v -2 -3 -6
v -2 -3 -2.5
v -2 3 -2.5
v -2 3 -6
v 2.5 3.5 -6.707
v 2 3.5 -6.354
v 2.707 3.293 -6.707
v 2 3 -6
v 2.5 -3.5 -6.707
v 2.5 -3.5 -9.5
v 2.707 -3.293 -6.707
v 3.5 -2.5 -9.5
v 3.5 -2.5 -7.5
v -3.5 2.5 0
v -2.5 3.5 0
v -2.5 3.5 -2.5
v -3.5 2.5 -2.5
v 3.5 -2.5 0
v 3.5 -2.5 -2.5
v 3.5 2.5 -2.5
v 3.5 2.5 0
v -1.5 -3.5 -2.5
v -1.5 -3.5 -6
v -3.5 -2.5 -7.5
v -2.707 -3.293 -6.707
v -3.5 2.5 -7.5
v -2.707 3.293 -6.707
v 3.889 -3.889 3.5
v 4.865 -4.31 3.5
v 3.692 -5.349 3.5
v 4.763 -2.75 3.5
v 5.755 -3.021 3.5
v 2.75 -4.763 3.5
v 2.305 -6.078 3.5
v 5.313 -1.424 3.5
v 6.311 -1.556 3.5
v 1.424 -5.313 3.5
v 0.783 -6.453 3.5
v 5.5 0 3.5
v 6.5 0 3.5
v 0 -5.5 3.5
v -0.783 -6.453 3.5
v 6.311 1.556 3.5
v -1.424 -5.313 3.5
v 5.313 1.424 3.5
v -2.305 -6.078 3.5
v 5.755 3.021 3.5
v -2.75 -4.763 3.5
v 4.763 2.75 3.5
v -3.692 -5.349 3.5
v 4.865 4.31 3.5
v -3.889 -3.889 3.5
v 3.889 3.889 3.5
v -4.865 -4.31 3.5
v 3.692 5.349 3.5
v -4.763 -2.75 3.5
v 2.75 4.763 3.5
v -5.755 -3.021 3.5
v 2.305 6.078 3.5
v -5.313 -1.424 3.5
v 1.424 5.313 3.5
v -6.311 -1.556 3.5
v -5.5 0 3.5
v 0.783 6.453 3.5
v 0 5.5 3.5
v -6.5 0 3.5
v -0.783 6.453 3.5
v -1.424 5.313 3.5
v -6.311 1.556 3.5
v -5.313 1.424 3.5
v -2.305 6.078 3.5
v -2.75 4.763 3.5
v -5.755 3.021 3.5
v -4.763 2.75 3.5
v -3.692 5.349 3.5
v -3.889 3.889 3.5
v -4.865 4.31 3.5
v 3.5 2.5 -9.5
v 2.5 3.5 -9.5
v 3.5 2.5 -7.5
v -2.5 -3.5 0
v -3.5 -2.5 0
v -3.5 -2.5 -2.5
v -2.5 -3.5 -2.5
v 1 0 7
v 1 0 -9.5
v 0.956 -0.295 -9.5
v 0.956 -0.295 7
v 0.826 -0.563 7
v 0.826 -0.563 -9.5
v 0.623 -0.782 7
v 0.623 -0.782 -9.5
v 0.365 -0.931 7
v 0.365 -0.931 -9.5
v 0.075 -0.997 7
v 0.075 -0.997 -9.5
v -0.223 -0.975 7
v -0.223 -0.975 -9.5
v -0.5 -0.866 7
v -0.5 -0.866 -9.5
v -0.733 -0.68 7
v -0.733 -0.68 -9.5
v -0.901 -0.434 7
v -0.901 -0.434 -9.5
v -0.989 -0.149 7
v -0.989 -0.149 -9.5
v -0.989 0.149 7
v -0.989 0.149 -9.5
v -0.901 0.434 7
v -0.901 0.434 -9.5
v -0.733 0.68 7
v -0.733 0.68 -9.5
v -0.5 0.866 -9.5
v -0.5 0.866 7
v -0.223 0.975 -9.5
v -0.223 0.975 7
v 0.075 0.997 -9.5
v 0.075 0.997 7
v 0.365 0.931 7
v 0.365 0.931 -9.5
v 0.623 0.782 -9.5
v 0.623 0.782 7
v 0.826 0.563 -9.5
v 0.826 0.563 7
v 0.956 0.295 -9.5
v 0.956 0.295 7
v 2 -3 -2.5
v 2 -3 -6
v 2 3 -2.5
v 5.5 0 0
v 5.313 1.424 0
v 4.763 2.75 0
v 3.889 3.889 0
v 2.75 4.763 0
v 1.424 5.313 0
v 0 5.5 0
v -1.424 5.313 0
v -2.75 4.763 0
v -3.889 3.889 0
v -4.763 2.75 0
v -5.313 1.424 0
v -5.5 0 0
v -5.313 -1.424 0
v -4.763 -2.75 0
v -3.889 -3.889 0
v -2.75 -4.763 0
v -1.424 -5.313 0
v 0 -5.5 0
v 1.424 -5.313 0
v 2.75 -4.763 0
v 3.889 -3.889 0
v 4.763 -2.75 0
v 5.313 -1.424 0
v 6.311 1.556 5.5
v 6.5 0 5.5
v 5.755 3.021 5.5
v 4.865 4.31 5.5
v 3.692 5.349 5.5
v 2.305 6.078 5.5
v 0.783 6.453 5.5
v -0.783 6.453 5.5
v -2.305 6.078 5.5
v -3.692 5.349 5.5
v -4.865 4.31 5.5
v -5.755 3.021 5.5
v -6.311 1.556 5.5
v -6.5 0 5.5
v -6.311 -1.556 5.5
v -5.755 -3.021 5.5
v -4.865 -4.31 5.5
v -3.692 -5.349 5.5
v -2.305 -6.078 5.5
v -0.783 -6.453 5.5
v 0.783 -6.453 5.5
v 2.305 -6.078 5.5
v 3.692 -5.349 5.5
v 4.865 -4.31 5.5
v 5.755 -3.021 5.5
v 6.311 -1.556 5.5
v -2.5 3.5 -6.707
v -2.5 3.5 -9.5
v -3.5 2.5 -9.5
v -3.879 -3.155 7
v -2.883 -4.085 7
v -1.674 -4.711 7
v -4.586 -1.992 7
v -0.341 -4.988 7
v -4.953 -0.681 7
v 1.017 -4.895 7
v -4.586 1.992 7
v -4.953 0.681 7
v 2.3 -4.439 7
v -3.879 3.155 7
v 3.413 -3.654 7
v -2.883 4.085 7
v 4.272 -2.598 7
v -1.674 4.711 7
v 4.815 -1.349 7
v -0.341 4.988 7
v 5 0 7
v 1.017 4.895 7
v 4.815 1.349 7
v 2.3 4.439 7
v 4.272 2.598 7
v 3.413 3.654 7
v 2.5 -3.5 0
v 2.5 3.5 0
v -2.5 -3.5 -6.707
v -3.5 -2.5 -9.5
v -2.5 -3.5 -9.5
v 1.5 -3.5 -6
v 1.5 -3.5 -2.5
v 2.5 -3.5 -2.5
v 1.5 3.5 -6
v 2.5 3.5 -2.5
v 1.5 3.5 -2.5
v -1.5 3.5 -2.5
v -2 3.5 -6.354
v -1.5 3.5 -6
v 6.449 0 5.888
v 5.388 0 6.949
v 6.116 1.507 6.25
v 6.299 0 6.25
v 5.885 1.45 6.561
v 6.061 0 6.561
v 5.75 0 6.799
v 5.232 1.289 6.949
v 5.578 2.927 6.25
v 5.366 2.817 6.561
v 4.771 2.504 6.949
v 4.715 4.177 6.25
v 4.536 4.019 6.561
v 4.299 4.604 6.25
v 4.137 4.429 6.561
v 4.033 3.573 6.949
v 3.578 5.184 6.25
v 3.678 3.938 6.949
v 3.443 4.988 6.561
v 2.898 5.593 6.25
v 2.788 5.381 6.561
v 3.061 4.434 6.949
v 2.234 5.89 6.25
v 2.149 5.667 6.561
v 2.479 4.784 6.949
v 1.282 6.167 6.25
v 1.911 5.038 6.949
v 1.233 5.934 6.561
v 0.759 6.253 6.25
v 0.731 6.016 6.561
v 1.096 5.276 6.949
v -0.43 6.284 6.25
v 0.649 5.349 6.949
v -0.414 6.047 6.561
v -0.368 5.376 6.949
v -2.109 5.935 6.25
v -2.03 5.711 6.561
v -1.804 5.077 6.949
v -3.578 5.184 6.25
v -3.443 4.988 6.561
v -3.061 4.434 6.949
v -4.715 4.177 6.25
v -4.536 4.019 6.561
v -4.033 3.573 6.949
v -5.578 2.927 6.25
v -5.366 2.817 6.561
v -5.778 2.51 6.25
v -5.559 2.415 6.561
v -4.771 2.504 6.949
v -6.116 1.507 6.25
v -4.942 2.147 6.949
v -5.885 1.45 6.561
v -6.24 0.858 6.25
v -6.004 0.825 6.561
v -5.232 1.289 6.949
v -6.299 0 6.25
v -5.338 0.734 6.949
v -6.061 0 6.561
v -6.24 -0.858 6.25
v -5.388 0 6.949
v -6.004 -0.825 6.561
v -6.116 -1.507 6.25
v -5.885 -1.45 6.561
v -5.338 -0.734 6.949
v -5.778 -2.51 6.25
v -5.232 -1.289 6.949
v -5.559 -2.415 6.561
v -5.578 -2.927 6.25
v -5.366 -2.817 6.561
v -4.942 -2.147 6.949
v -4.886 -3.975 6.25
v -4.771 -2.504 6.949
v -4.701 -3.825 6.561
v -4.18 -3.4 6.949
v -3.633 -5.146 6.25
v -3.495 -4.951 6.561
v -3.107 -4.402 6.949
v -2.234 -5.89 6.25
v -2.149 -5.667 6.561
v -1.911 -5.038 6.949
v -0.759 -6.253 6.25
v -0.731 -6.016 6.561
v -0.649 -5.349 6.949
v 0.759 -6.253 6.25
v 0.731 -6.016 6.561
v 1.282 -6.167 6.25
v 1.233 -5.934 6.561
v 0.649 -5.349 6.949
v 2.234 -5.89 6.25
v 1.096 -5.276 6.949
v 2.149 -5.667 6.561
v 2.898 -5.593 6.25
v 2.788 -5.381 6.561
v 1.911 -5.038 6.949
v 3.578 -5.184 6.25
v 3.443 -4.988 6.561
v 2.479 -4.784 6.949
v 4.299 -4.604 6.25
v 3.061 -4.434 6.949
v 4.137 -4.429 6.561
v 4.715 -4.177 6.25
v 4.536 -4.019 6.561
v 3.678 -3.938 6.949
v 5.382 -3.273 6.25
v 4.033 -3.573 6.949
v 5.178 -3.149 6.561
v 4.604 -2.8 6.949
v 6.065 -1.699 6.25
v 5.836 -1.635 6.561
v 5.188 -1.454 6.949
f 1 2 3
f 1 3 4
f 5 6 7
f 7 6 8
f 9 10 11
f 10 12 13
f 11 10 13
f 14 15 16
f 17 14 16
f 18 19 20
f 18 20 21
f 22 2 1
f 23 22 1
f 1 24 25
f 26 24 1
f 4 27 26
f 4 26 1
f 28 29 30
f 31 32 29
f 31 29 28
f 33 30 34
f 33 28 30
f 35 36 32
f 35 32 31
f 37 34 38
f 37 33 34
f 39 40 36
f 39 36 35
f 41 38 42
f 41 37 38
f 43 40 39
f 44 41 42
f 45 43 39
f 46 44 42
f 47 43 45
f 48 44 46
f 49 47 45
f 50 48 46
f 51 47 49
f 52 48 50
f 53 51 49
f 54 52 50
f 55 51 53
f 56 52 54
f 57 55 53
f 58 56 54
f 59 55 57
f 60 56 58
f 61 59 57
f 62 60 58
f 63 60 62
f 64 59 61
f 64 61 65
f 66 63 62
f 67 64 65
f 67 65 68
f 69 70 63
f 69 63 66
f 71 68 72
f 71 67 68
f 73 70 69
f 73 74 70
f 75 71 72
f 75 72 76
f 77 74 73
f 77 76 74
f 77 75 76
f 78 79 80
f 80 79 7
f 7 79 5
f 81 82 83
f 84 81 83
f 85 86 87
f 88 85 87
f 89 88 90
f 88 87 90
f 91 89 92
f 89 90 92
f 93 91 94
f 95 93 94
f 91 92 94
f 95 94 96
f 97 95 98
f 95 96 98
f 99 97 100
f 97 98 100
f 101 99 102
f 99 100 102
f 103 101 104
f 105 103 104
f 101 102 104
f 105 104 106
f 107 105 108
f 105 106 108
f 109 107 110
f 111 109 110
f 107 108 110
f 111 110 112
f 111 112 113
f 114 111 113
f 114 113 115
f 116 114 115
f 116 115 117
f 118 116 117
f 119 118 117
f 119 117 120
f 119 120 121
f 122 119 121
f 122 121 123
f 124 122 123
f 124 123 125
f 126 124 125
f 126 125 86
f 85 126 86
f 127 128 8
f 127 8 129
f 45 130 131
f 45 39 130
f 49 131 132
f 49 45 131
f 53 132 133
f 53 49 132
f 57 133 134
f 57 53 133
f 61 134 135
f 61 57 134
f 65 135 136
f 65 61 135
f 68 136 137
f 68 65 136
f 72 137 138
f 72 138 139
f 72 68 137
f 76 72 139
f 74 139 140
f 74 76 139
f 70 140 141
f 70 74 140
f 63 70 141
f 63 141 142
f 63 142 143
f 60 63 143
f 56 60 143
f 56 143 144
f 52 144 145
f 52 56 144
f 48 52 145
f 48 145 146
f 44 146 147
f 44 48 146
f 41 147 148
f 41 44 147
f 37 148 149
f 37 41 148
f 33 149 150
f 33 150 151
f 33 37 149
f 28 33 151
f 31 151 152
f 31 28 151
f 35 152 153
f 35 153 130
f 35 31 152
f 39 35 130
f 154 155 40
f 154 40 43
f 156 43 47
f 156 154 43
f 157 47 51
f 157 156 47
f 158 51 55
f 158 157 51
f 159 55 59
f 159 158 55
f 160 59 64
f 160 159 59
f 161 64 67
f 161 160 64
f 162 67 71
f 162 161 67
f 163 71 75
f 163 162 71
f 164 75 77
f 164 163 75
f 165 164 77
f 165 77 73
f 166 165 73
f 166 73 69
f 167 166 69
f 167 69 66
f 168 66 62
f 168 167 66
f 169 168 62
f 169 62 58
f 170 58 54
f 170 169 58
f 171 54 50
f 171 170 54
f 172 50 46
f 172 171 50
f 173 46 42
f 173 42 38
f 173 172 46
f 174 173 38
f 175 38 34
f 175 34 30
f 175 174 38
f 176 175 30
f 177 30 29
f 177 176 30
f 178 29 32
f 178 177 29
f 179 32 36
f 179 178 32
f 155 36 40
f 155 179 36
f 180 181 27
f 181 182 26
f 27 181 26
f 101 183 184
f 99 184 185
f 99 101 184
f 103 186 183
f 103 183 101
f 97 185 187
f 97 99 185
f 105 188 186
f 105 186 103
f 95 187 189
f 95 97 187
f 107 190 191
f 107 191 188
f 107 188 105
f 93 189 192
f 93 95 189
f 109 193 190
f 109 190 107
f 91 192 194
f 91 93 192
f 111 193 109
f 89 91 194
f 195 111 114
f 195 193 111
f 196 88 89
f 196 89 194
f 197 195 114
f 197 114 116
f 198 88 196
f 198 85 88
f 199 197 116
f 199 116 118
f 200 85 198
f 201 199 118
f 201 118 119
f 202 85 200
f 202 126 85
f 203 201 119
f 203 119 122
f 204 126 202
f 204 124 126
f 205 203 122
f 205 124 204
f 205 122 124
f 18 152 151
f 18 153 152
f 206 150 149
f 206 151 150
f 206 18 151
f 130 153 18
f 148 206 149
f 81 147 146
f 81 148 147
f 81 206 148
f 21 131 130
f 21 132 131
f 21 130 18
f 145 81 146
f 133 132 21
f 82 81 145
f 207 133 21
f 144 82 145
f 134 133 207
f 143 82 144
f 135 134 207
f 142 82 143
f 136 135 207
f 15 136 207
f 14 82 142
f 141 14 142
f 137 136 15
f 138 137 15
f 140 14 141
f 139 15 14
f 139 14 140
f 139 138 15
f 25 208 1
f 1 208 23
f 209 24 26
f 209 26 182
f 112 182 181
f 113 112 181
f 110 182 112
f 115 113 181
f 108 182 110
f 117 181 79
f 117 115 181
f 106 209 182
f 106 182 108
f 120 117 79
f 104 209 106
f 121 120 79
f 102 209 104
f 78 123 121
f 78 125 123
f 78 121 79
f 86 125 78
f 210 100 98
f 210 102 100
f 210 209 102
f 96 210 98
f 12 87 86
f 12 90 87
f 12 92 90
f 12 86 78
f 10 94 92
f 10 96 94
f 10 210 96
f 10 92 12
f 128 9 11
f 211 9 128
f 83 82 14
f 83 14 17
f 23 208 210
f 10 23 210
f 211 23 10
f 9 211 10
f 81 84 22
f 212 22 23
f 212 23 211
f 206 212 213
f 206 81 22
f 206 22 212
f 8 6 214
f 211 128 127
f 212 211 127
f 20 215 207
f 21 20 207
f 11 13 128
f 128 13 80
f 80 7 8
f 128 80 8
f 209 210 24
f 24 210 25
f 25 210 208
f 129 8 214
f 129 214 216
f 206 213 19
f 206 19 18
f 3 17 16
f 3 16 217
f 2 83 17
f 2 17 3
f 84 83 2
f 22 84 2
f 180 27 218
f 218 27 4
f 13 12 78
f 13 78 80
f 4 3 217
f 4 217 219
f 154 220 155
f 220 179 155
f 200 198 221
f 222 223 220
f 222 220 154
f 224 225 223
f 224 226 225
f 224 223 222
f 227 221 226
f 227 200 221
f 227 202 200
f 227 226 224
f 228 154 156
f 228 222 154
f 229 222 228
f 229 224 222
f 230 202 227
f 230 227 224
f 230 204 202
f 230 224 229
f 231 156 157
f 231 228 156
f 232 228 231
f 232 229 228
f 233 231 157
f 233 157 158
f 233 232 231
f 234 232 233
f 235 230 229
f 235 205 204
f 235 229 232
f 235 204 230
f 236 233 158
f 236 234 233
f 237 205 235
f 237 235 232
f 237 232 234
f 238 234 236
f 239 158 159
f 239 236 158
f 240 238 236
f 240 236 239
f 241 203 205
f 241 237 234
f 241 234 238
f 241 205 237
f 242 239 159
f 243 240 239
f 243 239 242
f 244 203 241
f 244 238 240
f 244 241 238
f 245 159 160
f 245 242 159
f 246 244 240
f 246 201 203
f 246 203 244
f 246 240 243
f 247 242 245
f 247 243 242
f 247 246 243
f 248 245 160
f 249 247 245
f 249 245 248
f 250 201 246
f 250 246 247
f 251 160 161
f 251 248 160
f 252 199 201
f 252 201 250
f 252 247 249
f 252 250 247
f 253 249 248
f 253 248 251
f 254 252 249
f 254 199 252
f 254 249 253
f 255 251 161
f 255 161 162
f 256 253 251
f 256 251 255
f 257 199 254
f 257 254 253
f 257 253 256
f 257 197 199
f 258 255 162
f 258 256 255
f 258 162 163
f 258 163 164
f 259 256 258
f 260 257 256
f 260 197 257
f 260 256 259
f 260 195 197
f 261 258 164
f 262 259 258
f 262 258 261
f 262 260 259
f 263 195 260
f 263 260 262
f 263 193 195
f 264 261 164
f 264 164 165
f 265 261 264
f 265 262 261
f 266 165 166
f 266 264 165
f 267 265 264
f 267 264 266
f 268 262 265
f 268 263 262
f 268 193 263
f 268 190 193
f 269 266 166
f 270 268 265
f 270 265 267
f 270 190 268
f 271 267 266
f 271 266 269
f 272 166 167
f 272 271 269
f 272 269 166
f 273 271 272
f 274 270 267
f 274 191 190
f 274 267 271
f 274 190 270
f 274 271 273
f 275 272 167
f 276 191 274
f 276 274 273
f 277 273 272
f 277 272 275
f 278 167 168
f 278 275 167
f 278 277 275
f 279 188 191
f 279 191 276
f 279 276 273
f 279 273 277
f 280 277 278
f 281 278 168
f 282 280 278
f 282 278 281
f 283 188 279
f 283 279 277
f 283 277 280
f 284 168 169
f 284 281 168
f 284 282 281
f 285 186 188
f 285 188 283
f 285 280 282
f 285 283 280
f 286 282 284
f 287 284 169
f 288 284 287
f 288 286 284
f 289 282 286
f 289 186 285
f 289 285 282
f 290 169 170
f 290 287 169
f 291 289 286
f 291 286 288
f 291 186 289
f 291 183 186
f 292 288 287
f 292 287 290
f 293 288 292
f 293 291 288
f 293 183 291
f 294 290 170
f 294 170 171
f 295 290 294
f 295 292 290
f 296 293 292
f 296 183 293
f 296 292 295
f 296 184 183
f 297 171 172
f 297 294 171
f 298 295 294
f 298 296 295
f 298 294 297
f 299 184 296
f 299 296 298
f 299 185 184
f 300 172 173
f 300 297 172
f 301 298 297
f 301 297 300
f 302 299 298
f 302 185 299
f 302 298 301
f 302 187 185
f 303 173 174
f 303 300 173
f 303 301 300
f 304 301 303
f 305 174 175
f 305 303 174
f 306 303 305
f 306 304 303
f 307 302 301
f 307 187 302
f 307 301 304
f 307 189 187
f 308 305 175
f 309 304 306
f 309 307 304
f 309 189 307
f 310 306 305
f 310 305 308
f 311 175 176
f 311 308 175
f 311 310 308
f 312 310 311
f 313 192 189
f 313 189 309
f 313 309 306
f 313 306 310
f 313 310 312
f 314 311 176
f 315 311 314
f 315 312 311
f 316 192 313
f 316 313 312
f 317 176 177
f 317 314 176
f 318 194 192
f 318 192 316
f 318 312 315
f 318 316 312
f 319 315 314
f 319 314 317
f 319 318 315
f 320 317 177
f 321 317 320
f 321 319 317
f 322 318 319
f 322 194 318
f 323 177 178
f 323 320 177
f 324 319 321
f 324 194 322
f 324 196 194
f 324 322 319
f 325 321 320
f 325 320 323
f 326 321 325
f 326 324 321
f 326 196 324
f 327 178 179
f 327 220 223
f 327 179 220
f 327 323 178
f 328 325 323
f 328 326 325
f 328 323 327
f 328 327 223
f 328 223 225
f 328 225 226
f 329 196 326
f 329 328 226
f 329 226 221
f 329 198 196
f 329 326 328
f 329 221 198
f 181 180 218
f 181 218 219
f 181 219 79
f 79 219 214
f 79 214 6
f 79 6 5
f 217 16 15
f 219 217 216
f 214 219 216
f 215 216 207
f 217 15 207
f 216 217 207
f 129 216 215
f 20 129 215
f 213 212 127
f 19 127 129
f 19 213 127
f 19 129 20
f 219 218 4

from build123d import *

# Parameters (mm, degrees)
F3_DEPTH     = 3.5
F4_SIZE      = 1
F5_SIZE      = 0.5
F6_T4_DEPTH  = 8.4221557451
F6_T11_DEPTH = 13.7150489639
F6_T21_DEPTH = 8.4221557451
F6_T28_DEPTH = 8.4221557451
F6_T35_DEPTH = 13.7150489639
F6_T45_DEPTH = 8.4221557451
F7_R         = 1.5
F8_R         = 1
F9_DEPTH     = 25


# Not quite as in the source:
# - a fillet or chamfer that OpenCascade refuses, or shapes differently, is made with other operations: its cross-section is extruded or revolved along the edge and cut away or added


with BuildPart() as f1:
    # F0 (on Front) → F1 (revolve)
    with BuildSketch(Plane.XZ):
        Polygon((0, 7), (0, 0), (5.5, 0), (5.5, 3.5), (6.5, 3.5), (6.5, 7), align=None)
    revolve(axis=Axis((0, 0, 5.0261294236), (0, 0, 1)))

    # F2 (on Front) → F3 (join, symmetric)
    with BuildSketch(Plane.XZ):
        Polygon((3.5, 0), (-3.5, 0), (-3.5, -2.5), (-2, -2.5), (-2, -7.5), (-3.5, -7.5), (-3.5, -9.5), (3.5, -9.5), (3.5, -7.5), (2, -7.5), (2, -2.5), (3.5, -2.5), align=None)
    extrude(amount=F3_DEPTH, both=True)

    # F4
    f4_edges = [f1.edges().sort_by_distance(p)[0] for p in [
        (3.5, -3.5, -1.25),
        (3.5, 3.5, -1.25),
        (-3.5, 3.5, -1.25),
        (-3.5, -3.5, -1.25),
        (-3.5, -3.5, -8.5),
        (3.5, -3.5, -8.5),
        (-3.5, 3.5, -8.5),
        (3.5, 3.5, -8.5),
    ]]
    chamfer(f4_edges, length=F4_SIZE)

    # F5
    f5_edges = [f1.edges().sort_by_distance(p)[0] for p in [
        (2, -3.5, -5),
        (-2, -3.5, -5),
        (-2, 3.5, -5),
        (2, 3.5, -5),
    ]]
    chamfer(f5_edges, length=F5_SIZE)

    # F6: chamfer of 1.5 on 6 edges, made by hand


with BuildPart() as f6_tool2:
    # F6_s3 → F6_t4 (new body)
    with BuildSketch(Plane(origin=(3.7276817198, -3.7276817198, 0), x_dir=(0, 0, 1), z_dir=(-0.7071067812, 0.7071067812, 0))):
        Polygon((-7.5, -5.0355339059), (-6, -3.5355339059), (-7.5, -3.5355339059), align=None)
    extrude(amount=F6_T4_DEPTH)

    split(bisect_by=Plane.XZ.offset(3.5), keep=Keep.BOTTOM)

    split(bisect_by=Plane(origin=(-3, -3, 0), x_dir=(0, 0, 1), z_dir=(0.7071067812, 0.7071067812, 0)), keep=Keep.TOP)

    split(bisect_by=Plane(origin=(2, 0, -2), x_dir=(0, 1, 0), z_dir=(0.7071067812, 0, -0.7071067812)), keep=Keep.TOP)


with BuildPart() as f1_1:
    add(f1.part)

    # F6_t1: union F6_tool2
    add(f6_tool2.part)


with BuildPart() as f6_tool9:
    # F6_s10 → F6_t11 (new body)
    with BuildSketch(Plane.XZ.offset(-6.8575244819)):
        Polygon((-3.5, -7.5), (-2, -6), (-2, -7.5), align=None)
    extrude(amount=F6_T11_DEPTH)

    split(bisect_by=Plane.XZ.offset(3.5), keep=Keep.BOTTOM)

    split(bisect_by=Plane(origin=(-3, -3, 0), x_dir=(0, 0, 1), z_dir=(0.7071067812, 0.7071067812, 0)), keep=Keep.TOP)

    split(bisect_by=Plane.XZ.offset(-3.5), keep=Keep.TOP)

    split(bisect_by=Plane(origin=(-3, 3, 0), x_dir=(0, 0, 1), z_dir=(0.7071067812, -0.7071067812, 0)), keep=Keep.TOP)

    split(bisect_by=Plane(origin=(0.8713203436, -0.8713203436, -1.232233047), x_dir=(0.7071067812, 0.7071067812, 0), z_dir=(0.5, -0.5, -0.7071067812)), keep=Keep.TOP)

    split(bisect_by=Plane(origin=(0.8713203436, 0.8713203436, -1.232233047), x_dir=(-0.7071067812, 0.7071067812, 0), z_dir=(0.5, 0.5, -0.7071067812)), keep=Keep.TOP)


with BuildPart() as f1_2:
    add(f1_1.part)

    # F6_t8: union F6_tool9
    add(f6_tool9.part)


with BuildPart() as f6_tool19:
    # F6_s20 → F6_t21 (new body)
    with BuildSketch(Plane(origin=(3.7276817198, 3.7276817198, 0), x_dir=(0, 0, 1), z_dir=(-0.7071067812, -0.7071067812, 0))):
        Polygon((-7.5, 5.0355339059), (-6, 3.5355339059), (-7.5, 3.5355339059), align=None)
    extrude(amount=F6_T21_DEPTH)

    split(bisect_by=Plane.XZ.offset(-3.5), keep=Keep.TOP)

    split(bisect_by=Plane(origin=(-3, 3, 0), x_dir=(0, 0, 1), z_dir=(0.7071067812, -0.7071067812, 0)), keep=Keep.TOP)

    split(bisect_by=Plane(origin=(2, 0, -2), x_dir=(0, 1, 0), z_dir=(0.7071067812, 0, -0.7071067812)), keep=Keep.TOP)


with BuildPart() as f1_3:
    add(f1_2.part)

    # F6_t18: union F6_tool19
    add(f6_tool19.part)


with BuildPart() as f6_tool26:
    # F6_s27 → F6_t28 (new body)
    with BuildSketch(Plane(origin=(-3.7276817198, -3.7276817198, 0), x_dir=(0, 0, 1), z_dir=(0.7071067812, 0.7071067812, 0))):
        Polygon((-7.5, 5.0355339059), (-6, 3.5355339059), (-7.5, 3.5355339059), align=None)
    extrude(amount=F6_T28_DEPTH)

    split(bisect_by=Plane.XZ.offset(3.5), keep=Keep.BOTTOM)

    split(bisect_by=Plane(origin=(3, -3, 0), x_dir=(0, 0, 1), z_dir=(-0.7071067812, 0.7071067812, 0)), keep=Keep.TOP)

    split(bisect_by=Plane(origin=(-2, 0, -2), x_dir=(0, 1, 0), z_dir=(-0.7071067812, 0, -0.7071067812)), keep=Keep.TOP)


with BuildPart() as f1_4:
    add(f1_3.part)

    # F6_t25: union F6_tool26
    add(f6_tool26.part)


with BuildPart() as f6_tool33:
    # F6_s34 → F6_t35 (new body)
    with BuildSketch(Plane.XZ.offset(-6.8575244819)):
        Polygon((3.5, -7.5), (2, -6), (2, -7.5), align=None)
    extrude(amount=F6_T35_DEPTH)

    split(bisect_by=Plane.XZ.offset(3.5), keep=Keep.BOTTOM)

    split(bisect_by=Plane(origin=(3, -3, 0), x_dir=(0, 0, 1), z_dir=(-0.7071067812, 0.7071067812, 0)), keep=Keep.TOP)

    split(bisect_by=Plane.XZ.offset(-3.5), keep=Keep.TOP)

    split(bisect_by=Plane(origin=(3, 3, 0), x_dir=(0, 0, 1), z_dir=(-0.7071067812, -0.7071067812, 0)), keep=Keep.TOP)

    split(bisect_by=Plane(origin=(-0.8713203436, -0.8713203436, -1.232233047), x_dir=(0.7071067812, -0.7071067812, 0), z_dir=(-0.5, -0.5, -0.7071067812)), keep=Keep.TOP)

    split(bisect_by=Plane(origin=(-0.8713203436, 0.8713203436, -1.232233047), x_dir=(-0.7071067812, -0.7071067812, 0), z_dir=(-0.5, 0.5, -0.7071067812)), keep=Keep.TOP)


with BuildPart() as f1_5:
    add(f1_4.part)

    # F6_t32: union F6_tool33
    add(f6_tool33.part)


with BuildPart() as f6_tool43:
    # F6_s44 → F6_t45 (new body)
    with BuildSketch(Plane(origin=(-3.7276817198, 3.7276817198, 0), x_dir=(0, 0, 1), z_dir=(0.7071067812, -0.7071067812, 0))):
        Polygon((-7.5, -5.0355339059), (-6, -3.5355339059), (-7.5, -3.5355339059), align=None)
    extrude(amount=F6_T45_DEPTH)

    split(bisect_by=Plane.XZ.offset(-3.5), keep=Keep.TOP)

    split(bisect_by=Plane(origin=(3, 3, 0), x_dir=(0, 0, 1), z_dir=(-0.7071067812, -0.7071067812, 0)), keep=Keep.TOP)

    split(bisect_by=Plane(origin=(-2, 0, -2), x_dir=(0, 1, 0), z_dir=(-0.7071067812, 0, -0.7071067812)), keep=Keep.TOP)


with BuildPart() as f1_6:
    add(f1_5.part)

    # F6_t42: union F6_tool43
    add(f6_tool43.part)

    # F7
    f7_edges = [f1_6.edges().sort_by_distance(p)[0] for p in [
        (-6.5, 0, 7),
    ]]
    fillet(f7_edges, radius=F7_R)

    # F8 (on face) → F9 (cut)
    with BuildSketch(Plane(origin=(0, 0, -9.5), x_dir=(1, 0, 0), z_dir=(0, 0, -1))):
        Circle(F8_R)
    extrude(amount=-F9_DEPTH, mode=Mode.SUBTRACT)


solid = f1_6.part
